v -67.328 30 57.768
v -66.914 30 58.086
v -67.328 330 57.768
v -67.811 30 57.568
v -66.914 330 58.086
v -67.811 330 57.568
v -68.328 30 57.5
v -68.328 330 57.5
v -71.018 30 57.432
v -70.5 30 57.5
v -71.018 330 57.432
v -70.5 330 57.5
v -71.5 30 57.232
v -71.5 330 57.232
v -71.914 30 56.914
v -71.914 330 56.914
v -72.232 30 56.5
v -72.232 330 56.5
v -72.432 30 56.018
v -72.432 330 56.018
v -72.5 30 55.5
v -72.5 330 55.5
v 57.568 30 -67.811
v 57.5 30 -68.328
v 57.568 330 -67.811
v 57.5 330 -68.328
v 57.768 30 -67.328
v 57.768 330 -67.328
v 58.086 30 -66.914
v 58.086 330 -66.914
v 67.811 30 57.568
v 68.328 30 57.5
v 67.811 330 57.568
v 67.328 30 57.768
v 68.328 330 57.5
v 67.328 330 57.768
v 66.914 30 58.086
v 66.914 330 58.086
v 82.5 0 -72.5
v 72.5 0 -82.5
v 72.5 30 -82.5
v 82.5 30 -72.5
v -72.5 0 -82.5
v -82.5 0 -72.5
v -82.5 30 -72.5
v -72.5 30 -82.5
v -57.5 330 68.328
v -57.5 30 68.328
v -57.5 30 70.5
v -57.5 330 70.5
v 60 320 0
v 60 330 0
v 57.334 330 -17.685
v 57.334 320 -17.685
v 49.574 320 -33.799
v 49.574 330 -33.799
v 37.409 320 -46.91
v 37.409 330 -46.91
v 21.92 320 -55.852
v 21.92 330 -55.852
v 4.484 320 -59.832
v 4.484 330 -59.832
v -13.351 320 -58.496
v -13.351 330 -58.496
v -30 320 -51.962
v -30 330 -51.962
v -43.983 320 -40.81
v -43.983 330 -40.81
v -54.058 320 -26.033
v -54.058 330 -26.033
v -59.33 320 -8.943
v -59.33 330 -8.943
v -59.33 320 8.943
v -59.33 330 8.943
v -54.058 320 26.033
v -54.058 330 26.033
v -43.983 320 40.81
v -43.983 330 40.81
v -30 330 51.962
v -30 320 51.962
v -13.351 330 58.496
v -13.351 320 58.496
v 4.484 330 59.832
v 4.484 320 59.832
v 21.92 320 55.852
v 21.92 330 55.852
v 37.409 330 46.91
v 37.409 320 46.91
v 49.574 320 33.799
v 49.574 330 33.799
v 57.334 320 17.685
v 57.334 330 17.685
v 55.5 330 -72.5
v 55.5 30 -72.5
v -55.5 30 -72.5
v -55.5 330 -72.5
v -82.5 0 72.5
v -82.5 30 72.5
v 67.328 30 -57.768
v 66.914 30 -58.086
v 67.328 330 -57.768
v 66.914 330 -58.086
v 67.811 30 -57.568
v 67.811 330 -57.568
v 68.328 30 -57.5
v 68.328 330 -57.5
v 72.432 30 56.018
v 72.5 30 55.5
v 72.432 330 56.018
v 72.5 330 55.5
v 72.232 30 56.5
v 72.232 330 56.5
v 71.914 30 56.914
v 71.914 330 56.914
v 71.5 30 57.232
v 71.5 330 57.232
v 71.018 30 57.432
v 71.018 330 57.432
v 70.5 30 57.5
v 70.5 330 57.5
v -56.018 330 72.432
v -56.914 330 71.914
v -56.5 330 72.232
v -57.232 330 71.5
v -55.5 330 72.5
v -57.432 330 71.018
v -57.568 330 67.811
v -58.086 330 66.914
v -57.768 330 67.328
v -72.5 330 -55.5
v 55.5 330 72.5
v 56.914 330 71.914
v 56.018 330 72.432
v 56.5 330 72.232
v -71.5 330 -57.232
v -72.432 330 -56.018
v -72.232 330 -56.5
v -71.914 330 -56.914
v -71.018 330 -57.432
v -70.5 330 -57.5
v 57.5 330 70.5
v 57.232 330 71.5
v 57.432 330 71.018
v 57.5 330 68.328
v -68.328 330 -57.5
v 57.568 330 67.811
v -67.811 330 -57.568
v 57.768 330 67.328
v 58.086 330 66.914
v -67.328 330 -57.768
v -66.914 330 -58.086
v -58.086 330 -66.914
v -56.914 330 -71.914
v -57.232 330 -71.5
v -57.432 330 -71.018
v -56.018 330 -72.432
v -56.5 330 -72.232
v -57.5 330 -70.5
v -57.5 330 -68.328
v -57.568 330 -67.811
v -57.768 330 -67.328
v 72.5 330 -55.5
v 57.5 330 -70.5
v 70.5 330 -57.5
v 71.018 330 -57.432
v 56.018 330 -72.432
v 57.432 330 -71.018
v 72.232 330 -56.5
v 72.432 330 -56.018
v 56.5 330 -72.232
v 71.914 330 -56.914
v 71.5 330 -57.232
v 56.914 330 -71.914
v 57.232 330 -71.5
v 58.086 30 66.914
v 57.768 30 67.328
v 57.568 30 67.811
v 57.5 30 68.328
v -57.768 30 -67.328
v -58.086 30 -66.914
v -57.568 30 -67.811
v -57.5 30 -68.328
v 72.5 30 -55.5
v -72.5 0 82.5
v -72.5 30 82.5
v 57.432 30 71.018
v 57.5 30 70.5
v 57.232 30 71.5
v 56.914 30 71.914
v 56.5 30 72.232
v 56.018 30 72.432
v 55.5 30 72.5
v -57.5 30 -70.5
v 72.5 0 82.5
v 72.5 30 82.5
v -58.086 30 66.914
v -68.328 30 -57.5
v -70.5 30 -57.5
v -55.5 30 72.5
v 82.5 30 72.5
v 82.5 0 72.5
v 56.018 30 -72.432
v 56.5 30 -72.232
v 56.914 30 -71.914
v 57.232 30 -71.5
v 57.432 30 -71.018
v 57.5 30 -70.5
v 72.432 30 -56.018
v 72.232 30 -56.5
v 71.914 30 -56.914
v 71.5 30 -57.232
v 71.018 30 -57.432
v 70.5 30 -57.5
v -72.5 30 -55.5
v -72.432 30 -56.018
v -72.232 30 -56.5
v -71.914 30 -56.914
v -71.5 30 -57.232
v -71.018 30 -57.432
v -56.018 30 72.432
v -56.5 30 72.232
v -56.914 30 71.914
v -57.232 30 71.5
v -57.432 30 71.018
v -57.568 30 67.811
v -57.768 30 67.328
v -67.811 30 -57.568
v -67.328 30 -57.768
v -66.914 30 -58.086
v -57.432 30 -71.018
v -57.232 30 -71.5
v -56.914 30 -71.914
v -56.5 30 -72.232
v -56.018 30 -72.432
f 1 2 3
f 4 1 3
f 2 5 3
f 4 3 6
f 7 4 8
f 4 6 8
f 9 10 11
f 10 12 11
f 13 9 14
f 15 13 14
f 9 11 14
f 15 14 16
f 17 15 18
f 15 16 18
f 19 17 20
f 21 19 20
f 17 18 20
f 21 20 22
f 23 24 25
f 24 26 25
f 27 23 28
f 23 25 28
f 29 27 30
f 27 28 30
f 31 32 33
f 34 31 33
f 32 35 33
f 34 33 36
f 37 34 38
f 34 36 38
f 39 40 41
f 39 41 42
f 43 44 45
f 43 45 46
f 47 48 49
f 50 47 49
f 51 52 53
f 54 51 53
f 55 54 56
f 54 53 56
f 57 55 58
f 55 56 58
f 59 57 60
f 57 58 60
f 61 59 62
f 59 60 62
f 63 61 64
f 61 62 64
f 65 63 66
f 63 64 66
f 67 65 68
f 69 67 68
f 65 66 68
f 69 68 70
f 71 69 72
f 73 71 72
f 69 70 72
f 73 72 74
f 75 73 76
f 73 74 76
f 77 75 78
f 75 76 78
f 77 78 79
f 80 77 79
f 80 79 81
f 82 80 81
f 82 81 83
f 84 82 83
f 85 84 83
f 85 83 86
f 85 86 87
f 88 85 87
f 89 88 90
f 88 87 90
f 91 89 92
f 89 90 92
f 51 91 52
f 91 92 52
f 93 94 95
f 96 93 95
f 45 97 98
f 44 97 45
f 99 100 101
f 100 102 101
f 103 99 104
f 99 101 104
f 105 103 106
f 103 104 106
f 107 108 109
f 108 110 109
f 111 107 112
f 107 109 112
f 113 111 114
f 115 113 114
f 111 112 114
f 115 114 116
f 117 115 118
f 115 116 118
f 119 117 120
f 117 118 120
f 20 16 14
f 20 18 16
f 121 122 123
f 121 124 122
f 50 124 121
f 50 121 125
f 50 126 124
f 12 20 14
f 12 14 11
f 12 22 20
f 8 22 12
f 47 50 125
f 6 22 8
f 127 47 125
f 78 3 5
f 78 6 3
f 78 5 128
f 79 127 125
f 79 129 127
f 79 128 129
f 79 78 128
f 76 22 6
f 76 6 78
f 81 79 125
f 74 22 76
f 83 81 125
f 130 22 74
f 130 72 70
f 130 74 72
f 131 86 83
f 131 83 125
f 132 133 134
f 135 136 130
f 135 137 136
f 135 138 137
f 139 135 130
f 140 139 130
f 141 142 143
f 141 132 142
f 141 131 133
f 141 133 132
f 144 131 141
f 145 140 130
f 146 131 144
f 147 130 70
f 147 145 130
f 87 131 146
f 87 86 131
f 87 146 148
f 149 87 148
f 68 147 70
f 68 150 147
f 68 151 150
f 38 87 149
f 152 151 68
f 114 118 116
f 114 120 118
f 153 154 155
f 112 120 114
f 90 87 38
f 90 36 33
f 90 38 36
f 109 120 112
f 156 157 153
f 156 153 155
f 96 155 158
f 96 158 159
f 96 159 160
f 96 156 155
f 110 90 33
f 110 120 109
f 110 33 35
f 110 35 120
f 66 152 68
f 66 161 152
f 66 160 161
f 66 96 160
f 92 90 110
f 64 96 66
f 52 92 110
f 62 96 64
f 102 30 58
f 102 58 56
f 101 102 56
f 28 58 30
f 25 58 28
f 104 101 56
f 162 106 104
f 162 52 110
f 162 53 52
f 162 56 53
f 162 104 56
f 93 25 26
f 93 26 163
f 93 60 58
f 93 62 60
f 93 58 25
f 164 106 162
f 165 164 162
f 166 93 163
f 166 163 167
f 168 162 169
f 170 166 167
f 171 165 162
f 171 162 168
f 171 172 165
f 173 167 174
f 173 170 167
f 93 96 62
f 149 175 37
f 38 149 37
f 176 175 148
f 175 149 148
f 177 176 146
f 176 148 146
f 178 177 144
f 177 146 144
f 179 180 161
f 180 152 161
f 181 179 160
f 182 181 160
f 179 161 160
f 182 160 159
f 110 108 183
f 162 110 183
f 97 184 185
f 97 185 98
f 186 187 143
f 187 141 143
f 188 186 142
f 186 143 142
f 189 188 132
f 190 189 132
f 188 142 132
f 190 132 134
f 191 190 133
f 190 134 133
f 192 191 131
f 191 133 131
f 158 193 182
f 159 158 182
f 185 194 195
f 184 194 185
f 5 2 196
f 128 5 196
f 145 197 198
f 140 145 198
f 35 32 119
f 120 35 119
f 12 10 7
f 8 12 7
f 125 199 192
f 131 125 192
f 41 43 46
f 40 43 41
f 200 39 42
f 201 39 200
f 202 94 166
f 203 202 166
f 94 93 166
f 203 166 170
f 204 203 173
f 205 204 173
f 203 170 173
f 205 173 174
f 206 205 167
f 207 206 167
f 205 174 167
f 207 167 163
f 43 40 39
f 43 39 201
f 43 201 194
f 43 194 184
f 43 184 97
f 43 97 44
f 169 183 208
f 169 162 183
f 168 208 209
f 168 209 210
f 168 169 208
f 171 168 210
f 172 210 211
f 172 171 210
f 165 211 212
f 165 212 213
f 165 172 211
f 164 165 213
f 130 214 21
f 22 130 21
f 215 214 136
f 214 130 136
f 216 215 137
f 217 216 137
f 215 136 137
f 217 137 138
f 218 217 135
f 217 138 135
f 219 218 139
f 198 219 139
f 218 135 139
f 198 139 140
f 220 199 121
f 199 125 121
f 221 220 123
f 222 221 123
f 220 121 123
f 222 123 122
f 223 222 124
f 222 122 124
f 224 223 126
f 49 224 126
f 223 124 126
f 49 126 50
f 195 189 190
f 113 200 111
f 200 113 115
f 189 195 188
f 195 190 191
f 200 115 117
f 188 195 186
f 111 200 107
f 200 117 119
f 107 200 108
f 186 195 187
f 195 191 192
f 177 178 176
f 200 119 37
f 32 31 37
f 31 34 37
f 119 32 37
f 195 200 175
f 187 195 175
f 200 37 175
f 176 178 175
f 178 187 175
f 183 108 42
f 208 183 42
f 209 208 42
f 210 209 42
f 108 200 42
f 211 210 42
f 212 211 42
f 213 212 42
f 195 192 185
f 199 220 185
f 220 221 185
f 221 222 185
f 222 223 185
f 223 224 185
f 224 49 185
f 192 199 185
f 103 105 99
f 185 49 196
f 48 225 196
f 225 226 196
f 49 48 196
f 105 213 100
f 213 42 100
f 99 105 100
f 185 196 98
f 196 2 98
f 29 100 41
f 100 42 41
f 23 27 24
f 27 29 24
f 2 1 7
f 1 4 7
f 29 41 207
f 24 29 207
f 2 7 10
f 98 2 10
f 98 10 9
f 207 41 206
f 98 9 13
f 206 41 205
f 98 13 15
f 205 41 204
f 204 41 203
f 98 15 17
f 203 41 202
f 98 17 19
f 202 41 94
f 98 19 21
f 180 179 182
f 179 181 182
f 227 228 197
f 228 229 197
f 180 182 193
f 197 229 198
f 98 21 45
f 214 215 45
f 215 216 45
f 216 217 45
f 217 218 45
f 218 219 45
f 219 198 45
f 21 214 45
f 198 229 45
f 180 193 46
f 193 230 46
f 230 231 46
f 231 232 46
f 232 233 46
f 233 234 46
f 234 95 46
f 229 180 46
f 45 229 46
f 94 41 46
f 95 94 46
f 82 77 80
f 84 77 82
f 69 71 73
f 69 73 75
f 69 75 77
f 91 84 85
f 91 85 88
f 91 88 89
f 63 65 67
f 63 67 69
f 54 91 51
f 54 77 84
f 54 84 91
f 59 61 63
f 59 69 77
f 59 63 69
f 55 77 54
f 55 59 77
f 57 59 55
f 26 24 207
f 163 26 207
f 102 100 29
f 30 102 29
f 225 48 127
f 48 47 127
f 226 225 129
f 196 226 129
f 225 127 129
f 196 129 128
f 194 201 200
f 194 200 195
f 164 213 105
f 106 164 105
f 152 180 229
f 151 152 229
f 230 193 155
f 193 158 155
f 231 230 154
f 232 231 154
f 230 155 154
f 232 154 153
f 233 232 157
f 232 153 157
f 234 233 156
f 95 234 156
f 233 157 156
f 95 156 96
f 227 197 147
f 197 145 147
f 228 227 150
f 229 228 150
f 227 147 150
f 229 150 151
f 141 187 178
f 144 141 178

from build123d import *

# Parameters (mm, degrees)
BOSS_EXTRUDE1_DEPTH = 30
BOSS_EXTRUDE2_DEPTH = 300
SKETCH3_R           = 60
CUT_EXTRUDE1_DEPTH  = 10
FILLET1_R           = 2


with BuildPart() as part:
    # Sketch1 → Boss-Extrude1 (new body)
    with BuildSketch(Plane(origin=(0, 0, 0), x_dir=(1, 0, 0), z_dir=(0, 1, 0))):
        Polygon((-82.5, 72.5), (-72.5, 82.5), (72.5, 82.5), (82.5, 72.5), (82.5, -72.5), (72.5, -82.5), (-72.5, -82.5), (-82.5, -72.5), align=None)
    extrude(amount=BOSS_EXTRUDE1_DEPTH)

    # Sketch2 → Boss-Extrude2 (add)
    with BuildSketch(Plane(origin=(0, 30, 0), x_dir=(1, 0, 0), z_dir=(0, 1, 0))):
        Polygon((72.5, 57.5), (67.5, 57.5), (57.5, 67.5), (57.5, 72.5), (-57.5, 72.5), (-57.5, 67.5), (-67.5, 57.5), (-72.5, 57.5), (-72.5, -57.5), (-67.5, -57.5), (-57.5, -67.5), (-57.5, -72.5), (57.5, -72.5), (57.5, -67.5), (67.5, -57.5), (72.5, -57.5), align=None)
    extrude(amount=BOSS_EXTRUDE2_DEPTH)

    # Sketch3 → Cut-Extrude1 (cut)
    with BuildSketch(Plane(origin=(0, 330, 0), x_dir=(1, 0, 0), z_dir=(0, 1, 0))):
        Circle(SKETCH3_R)
    extrude(amount=-CUT_EXTRUDE1_DEPTH, mode=Mode.SUBTRACT)

    # Fillet1
    fillet1_edges = [part.edges().sort_by_distance(p)[0] for p in [
        (72.5, 180, 57.5),
        (72.5, 180, -57.5),
        (67.5, 180, -57.5),
        (57.5, 180, -67.5),
        (57.5, 180, -72.5),
        (-57.5, 180, -72.5),
        (-57.5, 180, -67.5),
        (-67.5, 180, -57.5),
        (-72.5, 180, -57.5),
        (-72.5, 180, 57.5),
        (-67.5, 180, 57.5),
        (-57.5, 180, 67.5),
        (-57.5, 180, 72.5),
        (57.5, 180, 72.5),
        (57.5, 180, 67.5),
        (67.5, 180, 57.5),
    ]]
    fillet(fillet1_edges, radius=FILLET1_R)


solid = part.part
